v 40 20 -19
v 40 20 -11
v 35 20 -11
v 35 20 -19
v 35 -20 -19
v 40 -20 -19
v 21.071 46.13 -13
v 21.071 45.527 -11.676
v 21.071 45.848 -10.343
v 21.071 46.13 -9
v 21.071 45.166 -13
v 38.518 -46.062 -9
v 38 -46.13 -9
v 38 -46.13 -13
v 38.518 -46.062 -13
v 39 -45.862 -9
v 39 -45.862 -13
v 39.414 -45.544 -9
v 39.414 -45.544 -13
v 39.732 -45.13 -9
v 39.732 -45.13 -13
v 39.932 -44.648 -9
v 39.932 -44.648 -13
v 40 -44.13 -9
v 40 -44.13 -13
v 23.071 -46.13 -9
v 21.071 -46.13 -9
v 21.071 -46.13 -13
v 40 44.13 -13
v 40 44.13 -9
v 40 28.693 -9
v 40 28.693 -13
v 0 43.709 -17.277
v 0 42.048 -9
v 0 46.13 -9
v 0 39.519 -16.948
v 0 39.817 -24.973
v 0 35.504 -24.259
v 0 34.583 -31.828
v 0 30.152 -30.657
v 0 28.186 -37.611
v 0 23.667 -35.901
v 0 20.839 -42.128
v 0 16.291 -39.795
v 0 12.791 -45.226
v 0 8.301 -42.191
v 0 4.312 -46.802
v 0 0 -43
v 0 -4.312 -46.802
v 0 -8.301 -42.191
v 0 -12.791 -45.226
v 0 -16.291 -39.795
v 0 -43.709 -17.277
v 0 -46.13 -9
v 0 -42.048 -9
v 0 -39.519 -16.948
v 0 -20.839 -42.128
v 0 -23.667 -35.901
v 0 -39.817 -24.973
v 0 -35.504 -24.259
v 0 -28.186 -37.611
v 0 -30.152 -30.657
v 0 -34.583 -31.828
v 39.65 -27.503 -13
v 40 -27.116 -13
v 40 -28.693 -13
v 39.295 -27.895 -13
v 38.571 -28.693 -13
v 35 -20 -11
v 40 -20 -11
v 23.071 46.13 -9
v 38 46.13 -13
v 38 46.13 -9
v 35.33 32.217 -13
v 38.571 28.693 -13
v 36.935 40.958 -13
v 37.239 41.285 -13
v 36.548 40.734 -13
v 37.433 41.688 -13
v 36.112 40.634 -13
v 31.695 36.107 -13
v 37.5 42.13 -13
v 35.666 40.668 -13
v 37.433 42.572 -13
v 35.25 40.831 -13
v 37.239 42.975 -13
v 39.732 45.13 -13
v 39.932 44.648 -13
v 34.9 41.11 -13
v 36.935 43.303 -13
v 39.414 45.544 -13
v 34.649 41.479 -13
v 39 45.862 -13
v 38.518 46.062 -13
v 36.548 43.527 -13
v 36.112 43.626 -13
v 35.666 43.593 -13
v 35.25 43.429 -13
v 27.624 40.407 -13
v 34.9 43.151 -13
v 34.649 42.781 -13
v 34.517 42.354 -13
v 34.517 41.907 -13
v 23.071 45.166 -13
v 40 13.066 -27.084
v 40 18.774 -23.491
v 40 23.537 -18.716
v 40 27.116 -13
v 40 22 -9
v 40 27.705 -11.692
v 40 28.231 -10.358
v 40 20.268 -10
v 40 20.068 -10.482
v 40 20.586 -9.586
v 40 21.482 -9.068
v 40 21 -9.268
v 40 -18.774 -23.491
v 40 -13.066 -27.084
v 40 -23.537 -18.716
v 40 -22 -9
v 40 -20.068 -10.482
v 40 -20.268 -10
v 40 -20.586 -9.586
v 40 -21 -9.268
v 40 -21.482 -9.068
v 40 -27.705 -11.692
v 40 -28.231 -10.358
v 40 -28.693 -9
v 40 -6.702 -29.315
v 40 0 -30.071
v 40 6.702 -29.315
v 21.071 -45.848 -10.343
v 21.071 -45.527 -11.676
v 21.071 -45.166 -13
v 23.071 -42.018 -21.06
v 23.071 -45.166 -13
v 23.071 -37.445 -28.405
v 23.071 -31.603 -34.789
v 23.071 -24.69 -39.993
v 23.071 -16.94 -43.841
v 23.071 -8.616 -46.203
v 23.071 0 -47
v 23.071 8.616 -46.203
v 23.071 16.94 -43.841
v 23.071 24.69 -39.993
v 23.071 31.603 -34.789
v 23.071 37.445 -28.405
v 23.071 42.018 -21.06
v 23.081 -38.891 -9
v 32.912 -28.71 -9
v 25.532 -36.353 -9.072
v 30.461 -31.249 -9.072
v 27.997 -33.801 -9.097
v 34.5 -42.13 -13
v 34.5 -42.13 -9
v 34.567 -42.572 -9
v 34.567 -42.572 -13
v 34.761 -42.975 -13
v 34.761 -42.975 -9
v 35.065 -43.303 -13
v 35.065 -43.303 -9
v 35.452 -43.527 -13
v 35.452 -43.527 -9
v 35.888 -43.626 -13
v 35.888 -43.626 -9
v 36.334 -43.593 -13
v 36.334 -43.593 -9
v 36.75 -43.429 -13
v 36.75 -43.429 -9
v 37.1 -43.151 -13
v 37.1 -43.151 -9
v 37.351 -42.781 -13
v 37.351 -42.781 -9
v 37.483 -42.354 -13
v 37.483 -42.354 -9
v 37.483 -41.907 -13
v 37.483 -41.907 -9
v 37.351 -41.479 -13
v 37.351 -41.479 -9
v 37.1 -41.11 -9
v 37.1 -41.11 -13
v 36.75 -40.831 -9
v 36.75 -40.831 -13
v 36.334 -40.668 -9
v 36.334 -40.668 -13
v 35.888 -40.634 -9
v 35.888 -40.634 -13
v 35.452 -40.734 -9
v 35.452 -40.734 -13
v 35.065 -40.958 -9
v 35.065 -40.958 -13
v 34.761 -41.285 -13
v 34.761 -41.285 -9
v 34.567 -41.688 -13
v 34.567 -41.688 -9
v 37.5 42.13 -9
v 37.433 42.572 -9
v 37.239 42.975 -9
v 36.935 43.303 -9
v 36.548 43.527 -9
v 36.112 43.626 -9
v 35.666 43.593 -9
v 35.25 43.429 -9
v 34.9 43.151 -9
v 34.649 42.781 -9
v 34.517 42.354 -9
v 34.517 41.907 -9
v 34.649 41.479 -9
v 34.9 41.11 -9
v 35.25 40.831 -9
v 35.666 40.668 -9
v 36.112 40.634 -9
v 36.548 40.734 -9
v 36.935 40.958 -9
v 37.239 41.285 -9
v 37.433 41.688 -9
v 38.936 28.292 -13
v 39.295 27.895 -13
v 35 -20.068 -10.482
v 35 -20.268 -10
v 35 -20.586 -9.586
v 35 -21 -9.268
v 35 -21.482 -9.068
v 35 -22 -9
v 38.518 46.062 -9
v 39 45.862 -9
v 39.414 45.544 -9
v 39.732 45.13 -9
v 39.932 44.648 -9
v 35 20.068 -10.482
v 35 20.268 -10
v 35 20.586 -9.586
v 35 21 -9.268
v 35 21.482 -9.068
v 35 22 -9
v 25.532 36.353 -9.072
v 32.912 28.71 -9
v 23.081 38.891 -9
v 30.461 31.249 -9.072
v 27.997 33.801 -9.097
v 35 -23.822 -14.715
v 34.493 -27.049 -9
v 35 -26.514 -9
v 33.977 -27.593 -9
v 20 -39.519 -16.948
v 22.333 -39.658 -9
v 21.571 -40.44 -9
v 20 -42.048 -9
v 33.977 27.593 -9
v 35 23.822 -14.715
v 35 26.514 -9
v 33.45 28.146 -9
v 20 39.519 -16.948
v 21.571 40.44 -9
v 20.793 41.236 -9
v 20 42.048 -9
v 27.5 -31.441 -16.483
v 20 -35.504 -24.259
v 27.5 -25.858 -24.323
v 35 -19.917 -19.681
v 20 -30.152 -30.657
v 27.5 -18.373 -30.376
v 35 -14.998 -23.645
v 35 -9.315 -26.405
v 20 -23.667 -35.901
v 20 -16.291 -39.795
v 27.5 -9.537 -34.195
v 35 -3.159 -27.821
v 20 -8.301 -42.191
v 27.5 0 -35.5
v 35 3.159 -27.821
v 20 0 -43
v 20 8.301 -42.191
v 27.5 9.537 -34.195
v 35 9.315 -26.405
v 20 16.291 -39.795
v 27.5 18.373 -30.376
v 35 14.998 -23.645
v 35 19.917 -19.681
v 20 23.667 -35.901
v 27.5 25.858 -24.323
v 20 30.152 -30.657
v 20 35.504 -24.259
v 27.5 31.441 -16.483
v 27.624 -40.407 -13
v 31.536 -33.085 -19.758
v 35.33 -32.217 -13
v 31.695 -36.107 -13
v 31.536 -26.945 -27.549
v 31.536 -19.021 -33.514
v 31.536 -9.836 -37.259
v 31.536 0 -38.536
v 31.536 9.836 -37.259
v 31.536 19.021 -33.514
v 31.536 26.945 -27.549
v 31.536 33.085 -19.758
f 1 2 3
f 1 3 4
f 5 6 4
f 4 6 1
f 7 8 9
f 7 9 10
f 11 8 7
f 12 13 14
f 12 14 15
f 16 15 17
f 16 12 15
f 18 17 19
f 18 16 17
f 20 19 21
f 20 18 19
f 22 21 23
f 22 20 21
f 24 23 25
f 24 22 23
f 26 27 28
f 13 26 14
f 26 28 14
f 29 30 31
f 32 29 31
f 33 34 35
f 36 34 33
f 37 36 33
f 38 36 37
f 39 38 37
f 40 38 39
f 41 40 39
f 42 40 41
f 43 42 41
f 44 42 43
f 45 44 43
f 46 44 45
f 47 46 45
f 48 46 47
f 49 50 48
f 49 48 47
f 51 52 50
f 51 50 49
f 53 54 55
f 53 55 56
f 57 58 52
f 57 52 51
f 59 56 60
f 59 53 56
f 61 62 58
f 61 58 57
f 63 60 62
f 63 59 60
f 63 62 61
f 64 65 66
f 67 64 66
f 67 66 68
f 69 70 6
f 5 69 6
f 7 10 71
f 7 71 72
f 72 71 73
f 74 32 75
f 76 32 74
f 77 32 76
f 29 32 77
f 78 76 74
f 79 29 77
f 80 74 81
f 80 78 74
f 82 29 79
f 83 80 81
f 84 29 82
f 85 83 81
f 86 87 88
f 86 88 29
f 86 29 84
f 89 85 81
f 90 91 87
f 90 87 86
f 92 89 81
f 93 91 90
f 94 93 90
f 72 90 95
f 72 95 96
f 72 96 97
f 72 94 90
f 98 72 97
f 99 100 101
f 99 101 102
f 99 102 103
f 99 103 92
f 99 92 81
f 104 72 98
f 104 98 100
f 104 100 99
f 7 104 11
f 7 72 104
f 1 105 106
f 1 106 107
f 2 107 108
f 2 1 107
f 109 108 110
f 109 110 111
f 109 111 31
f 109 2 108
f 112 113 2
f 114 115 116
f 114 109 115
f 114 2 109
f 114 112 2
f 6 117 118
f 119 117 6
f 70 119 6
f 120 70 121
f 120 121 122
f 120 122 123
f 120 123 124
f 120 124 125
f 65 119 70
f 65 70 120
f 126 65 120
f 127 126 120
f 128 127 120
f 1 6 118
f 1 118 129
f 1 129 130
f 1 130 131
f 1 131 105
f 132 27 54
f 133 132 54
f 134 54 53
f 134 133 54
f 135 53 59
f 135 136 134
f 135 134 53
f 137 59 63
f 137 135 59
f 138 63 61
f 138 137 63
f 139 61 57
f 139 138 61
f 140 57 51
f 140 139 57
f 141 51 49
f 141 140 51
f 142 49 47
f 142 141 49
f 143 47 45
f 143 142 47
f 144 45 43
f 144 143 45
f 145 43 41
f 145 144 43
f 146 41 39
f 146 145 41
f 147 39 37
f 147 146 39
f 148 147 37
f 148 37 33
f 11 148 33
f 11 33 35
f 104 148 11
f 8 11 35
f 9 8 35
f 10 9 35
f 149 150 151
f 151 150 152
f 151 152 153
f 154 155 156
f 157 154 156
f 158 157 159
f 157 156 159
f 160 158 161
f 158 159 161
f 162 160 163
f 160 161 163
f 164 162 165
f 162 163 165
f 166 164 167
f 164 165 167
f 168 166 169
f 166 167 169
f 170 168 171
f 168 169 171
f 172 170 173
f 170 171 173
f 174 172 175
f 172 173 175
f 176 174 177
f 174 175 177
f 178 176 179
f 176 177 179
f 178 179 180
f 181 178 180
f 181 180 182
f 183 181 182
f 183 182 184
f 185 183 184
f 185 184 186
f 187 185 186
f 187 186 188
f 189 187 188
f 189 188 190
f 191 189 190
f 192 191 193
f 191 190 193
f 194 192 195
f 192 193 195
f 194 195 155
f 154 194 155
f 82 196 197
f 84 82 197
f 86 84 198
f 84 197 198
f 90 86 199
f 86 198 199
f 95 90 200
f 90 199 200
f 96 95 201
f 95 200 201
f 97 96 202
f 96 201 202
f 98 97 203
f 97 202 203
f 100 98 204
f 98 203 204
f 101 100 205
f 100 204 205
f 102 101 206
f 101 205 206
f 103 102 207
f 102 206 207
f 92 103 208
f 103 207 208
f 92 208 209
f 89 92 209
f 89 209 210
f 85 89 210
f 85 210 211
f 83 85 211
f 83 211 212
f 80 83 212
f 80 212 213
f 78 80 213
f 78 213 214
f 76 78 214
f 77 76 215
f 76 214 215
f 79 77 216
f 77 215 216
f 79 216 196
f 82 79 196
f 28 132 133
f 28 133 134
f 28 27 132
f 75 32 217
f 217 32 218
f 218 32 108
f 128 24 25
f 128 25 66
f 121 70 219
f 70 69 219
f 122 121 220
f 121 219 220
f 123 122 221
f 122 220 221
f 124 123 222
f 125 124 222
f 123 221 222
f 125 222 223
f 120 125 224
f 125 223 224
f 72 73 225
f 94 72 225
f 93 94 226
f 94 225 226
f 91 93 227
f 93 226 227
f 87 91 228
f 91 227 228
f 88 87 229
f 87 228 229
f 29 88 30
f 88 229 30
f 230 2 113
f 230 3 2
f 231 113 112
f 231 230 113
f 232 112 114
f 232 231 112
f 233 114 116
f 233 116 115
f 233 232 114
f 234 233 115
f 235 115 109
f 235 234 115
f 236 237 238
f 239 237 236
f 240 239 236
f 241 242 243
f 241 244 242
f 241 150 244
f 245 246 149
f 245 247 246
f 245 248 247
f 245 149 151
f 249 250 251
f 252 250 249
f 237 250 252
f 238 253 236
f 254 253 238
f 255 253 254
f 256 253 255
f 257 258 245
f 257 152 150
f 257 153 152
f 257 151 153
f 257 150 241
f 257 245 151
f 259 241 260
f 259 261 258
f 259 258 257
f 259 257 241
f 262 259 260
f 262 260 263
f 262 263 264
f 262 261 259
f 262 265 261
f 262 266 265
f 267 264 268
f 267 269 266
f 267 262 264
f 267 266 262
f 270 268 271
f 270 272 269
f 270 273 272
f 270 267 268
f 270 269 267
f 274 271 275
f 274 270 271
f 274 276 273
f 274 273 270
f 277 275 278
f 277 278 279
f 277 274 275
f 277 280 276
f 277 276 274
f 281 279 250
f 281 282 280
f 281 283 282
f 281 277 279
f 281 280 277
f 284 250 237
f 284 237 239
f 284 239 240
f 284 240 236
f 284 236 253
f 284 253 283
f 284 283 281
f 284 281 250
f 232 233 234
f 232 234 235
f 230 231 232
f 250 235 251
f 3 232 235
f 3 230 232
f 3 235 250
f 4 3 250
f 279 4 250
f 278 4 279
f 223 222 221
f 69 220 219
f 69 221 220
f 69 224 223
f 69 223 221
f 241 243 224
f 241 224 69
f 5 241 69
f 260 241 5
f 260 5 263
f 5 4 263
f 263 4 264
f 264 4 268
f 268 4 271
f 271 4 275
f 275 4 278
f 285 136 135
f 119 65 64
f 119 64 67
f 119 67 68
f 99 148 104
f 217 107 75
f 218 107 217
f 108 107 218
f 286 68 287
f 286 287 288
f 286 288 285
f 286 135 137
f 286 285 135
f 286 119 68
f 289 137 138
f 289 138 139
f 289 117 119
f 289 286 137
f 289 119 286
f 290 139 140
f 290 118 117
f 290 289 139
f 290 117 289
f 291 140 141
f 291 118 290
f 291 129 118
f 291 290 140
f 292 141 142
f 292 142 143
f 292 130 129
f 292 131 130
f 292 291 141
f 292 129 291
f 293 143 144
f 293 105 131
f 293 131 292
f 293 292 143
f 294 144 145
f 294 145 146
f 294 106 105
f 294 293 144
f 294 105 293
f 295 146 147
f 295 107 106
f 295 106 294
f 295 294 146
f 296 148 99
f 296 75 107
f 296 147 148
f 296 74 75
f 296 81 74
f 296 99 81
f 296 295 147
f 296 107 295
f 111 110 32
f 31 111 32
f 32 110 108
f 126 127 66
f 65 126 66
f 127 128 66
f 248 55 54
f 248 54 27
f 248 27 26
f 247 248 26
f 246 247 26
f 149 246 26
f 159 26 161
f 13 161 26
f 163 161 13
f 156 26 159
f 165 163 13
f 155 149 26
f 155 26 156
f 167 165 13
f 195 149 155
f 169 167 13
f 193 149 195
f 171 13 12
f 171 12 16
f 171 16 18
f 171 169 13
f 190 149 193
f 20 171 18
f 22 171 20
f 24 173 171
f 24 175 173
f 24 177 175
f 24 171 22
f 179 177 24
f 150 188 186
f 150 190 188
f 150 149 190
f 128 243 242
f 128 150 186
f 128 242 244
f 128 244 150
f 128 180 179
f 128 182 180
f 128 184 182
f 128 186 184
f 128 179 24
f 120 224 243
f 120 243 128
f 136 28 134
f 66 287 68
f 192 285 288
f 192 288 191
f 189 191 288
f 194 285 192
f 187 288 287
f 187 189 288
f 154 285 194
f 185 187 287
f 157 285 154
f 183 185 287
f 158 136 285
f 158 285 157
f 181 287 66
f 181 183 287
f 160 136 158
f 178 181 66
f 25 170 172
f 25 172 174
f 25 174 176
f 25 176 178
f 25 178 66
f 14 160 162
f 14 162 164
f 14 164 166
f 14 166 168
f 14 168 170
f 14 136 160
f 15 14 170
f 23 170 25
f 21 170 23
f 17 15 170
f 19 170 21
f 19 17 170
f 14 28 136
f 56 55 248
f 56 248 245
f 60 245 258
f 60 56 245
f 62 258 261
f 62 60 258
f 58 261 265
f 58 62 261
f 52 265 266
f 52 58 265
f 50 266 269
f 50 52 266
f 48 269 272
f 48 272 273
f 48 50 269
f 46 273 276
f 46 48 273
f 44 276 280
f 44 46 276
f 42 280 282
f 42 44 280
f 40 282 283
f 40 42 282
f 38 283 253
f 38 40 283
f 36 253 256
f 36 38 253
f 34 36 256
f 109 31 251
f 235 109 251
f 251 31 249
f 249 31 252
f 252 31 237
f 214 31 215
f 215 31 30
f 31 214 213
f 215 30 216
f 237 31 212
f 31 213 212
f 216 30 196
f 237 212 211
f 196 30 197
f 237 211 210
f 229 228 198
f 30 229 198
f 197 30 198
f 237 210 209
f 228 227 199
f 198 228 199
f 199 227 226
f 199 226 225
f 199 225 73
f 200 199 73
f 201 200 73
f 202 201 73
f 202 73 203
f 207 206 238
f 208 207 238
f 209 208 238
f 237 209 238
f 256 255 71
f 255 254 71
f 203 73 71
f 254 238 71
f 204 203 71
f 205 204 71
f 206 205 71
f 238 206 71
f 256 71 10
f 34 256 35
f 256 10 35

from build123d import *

# Parameters (mm, degrees)
CUT_EXTRUDE1_DEPTH      = 78.575769413
CUT_EXTRUDE1_DEPTH_BACK = 9
SKETCH2_W               = 40
SKETCH2_H               = 94
SKETCH3_W               = 10
SKETCH3_H               = 40
CUT_EXTRUDE2_DEPTH      = 78.05193054
SKETCH4_R               = 1.5
BOSS_EXTRUDE1_DEPTH     = 4
MOVE_START              = -46.130250379
MOVE_FACE1_OUTLINE_W    = 16.928932188
MOVE_FACE1_OUTLINE_H    = 4
MOVE_FACE1_DEPTH        = 0.963891216
MOVE_START_2            = 45.166359163
MOVE_FACE1_2_OUTLINE_W  = 16.928932188
MOVE_FACE1_2_OUTLINE_H  = 4
MOVE_FACE1_2_DEPTH      = 0.963891216
MOVE_START_3            = -28.692666648
MOVE_FACE1_3_DEPTH      = 1.57682047
MOVE_START_4            = 27.115846178
MOVE_FACE1_4_DEPTH      = 1.57682047
FILLET1_R               = 2


with BuildPart() as part:
    # Sketch1 → Revolve1 (revolve)
    with BuildSketch(Plane.XY, mode=Mode.PRIVATE) as revolve1_sk:
        Polygon((0, 47), (23.071067812, 47), (40, 30.071067812), (40, 0), (35, 0), (35, 28), (20, 43), (0, 43), align=None)
    revolve(revolve1_sk.sketch.rotate(Axis((0, 0, 0), (1, 0, 0)), 90), axis=Axis((0, 0, 0), (1, 0, 0)))

    # Sketch2 → Cut-Extrude1 (cut, two sides: drawn at the far end of the back side and taken through both)
    with BuildSketch(Plane.XY.offset(-CUT_EXTRUDE1_DEPTH_BACK)):
        with Locations((20, 0)):
            Rectangle(SKETCH2_W, SKETCH2_H)
    extrude(amount=CUT_EXTRUDE1_DEPTH + CUT_EXTRUDE1_DEPTH_BACK, mode=Mode.SUBTRACT)

    # Sketch3 → Cut-Extrude2 (cut, through all)
    with BuildSketch(Plane(origin=(40, 0, 0), x_dir=(0, 0, -1), z_dir=(1, 0, 0))):
        with Locations((14, 0)):
            Rectangle(SKETCH3_W, SKETCH3_H)
    extrude(amount=-CUT_EXTRUDE2_DEPTH, mode=Mode.SUBTRACT)

    # Sketch4 → Boss-Extrude1 (add)
    # profile 1 of 2: a face of its own
    with BuildSketch(Plane.XY.offset(-9)):
        with BuildLine():
            Line((23.071067812, 46.130250379), (38, 46.130250379))
            ThreePointArc((38, 46.130250379), (39.414213562, 45.544463941), (40, 44.130250379))
            Line((40, 44.130250379), (40, 28.692666648))
            Line((40, 28.692666648), (32.929135877, 28.692666648))
            Line((32.929135877, 28.692666648), (23.071067812, 38.901502546))
            Line((23.071067812, 38.901502546), (23.071067812, 46.130250379))
        make_face()
        with Locations((36, 42.130250379)):
            Circle(SKETCH4_R, mode=Mode.SUBTRACT)
    # profile 2 of 2: a face of its own
    with BuildSketch(Plane.XY.offset(-9)):
        with BuildLine():
            Line((23.071067812, -38.901502546), (23.071067812, -46.130250379))
            Line((23.071067812, -46.130250379), (38, -46.130250379))
            ThreePointArc((38, -46.130250379), (39.414213562, -45.544463941), (40, -44.130250379))
            Line((40, -44.130250379), (40, -28.692666648))
            Line((40, -28.692666648), (32.929135877, -28.692666648))
            Line((32.929135877, -28.692666648), (23.071067812, -38.901502546))
        make_face()
        with Locations(Location((36, -42.130250379, 0), (0, 0, 180))):
            Circle(SKETCH4_R, mode=Mode.SUBTRACT)
    extrude(amount=-BOSS_EXTRUDE1_DEPTH)


with BuildPart() as move_face1_tool:
    # Move Face1: read off the stored shape, not the designer's step
    # Move Face1 outline → Move Face1 (new body)
    with BuildSketch(Plane(origin=(0, 0, 0), x_dir=(1, 0, 0), z_dir=(0, 1, 0)).offset(MOVE_START)):
        with Locations((29.535533906, 11)):
            Rectangle(MOVE_FACE1_OUTLINE_W, MOVE_FACE1_OUTLINE_H)
    extrude(amount=MOVE_FACE1_DEPTH)


with BuildPart() as part_1:
    add(part.part)


with BuildPart() as part_2:
    # Move Face1: joined with move_face1_tool
    add(part_1.part.fuse(move_face1_tool.part, tol=0.00001))


with BuildPart() as move_face1_2_tool:
    # Move Face1 2 outline → Move Face1 2 (new body)
    with BuildSketch(Plane(origin=(0, 0, 0), x_dir=(1, 0, 0), z_dir=(0, 1, 0)).offset(MOVE_START_2)):
        with Locations((29.535533906, 11)):
            Rectangle(MOVE_FACE1_2_OUTLINE_W, MOVE_FACE1_2_OUTLINE_H)
    extrude(amount=MOVE_FACE1_2_DEPTH)


with BuildPart() as part_3:
    add(part_2.part)


with BuildPart() as part_4:
    # Move Face1 2: joined with move_face1_2_tool
    add(part_3.part.fuse(move_face1_2_tool.part, tol=0.00001))


with BuildPart() as move_face1_3_tool:
    # Move Face1 3 outline → Move Face1 3 (new body)
    with BuildSketch(Plane(origin=(0, 0, 0), x_dir=(1, 0, 0), z_dir=(0, 1, 0)).offset(MOVE_START_3)):
        with BuildLine():
            Line((40, 13), (38.57076781, 13.000001435))
            add(Edge.make_bspline(
                [(38.57076781, 13.000001435), (38.71437599, 12.652027053), (38.853897492, 12.302357037), (39.340707465, 11.036237384), (39.662536412, 10.10974197), (39.965458557, 9.114909953), (39.982798274, 9.057475387), (40.00000015, 9.000000045)],
                knots=[15.019424216, 15.019424216, 15.019424216, 15.019424216, 16.148697383, 16.148697383, 19.088168409, 19.088168409, 19.268134003, 19.268134003, 19.268134003, 19.268134003], degree=3))
            Line((40.00000015, 9.000000045), (40, 13))
        make_face()
    extrude(amount=MOVE_FACE1_3_DEPTH)


with BuildPart() as part_5:
    add(part_4.part)


with BuildPart() as part_6:
    # Move Face1 3: joined with move_face1_3_tool
    add(part_5.part.fuse(move_face1_3_tool.part, tol=0.00001))


with BuildPart() as move_face1_4_tool:
    # Move Face1 4 outline → Move Face1 4 (new body)
    with BuildSketch(Plane(origin=(0, 0, 0), x_dir=(1, 0, 0), z_dir=(0, 1, 0)).offset(MOVE_START_4)):
        with BuildLine():
            Line((40, 13), (38.57076781, 13.000001435))
            add(Edge.make_bspline(
                [(38.57076781, 13.000001435), (38.71437599, 12.652027053), (38.853897492, 12.302357037), (39.340707465, 11.036237384), (39.662536412, 10.10974197), (39.965458557, 9.114909953), (39.982798274, 9.057475387), (40.00000015, 9.000000045)],
                knots=[15.019424216, 15.019424216, 15.019424216, 15.019424216, 16.148697383, 16.148697383, 19.088168409, 19.088168409, 19.268134003, 19.268134003, 19.268134003, 19.268134003], degree=3))
            Line((40.00000015, 9.000000045), (40, 13))
        make_face()
    extrude(amount=MOVE_FACE1_4_DEPTH)


with BuildPart() as part_7:
    add(part_6.part)


with BuildPart() as part_8:
    # Move Face1 4: joined with move_face1_4_tool
    add(part_7.part.fuse(move_face1_4_tool.part, tol=0.00001))

    # Fillet1
    fillet1_edges = [part_8.edges().sort_by_distance(p)[0] for p in [
        (37.5, -20, -9),
        (37.5, 20, -9),
    ]]
    fillet(fillet1_edges, radius=FILLET1_R)


solid = part_8.part
